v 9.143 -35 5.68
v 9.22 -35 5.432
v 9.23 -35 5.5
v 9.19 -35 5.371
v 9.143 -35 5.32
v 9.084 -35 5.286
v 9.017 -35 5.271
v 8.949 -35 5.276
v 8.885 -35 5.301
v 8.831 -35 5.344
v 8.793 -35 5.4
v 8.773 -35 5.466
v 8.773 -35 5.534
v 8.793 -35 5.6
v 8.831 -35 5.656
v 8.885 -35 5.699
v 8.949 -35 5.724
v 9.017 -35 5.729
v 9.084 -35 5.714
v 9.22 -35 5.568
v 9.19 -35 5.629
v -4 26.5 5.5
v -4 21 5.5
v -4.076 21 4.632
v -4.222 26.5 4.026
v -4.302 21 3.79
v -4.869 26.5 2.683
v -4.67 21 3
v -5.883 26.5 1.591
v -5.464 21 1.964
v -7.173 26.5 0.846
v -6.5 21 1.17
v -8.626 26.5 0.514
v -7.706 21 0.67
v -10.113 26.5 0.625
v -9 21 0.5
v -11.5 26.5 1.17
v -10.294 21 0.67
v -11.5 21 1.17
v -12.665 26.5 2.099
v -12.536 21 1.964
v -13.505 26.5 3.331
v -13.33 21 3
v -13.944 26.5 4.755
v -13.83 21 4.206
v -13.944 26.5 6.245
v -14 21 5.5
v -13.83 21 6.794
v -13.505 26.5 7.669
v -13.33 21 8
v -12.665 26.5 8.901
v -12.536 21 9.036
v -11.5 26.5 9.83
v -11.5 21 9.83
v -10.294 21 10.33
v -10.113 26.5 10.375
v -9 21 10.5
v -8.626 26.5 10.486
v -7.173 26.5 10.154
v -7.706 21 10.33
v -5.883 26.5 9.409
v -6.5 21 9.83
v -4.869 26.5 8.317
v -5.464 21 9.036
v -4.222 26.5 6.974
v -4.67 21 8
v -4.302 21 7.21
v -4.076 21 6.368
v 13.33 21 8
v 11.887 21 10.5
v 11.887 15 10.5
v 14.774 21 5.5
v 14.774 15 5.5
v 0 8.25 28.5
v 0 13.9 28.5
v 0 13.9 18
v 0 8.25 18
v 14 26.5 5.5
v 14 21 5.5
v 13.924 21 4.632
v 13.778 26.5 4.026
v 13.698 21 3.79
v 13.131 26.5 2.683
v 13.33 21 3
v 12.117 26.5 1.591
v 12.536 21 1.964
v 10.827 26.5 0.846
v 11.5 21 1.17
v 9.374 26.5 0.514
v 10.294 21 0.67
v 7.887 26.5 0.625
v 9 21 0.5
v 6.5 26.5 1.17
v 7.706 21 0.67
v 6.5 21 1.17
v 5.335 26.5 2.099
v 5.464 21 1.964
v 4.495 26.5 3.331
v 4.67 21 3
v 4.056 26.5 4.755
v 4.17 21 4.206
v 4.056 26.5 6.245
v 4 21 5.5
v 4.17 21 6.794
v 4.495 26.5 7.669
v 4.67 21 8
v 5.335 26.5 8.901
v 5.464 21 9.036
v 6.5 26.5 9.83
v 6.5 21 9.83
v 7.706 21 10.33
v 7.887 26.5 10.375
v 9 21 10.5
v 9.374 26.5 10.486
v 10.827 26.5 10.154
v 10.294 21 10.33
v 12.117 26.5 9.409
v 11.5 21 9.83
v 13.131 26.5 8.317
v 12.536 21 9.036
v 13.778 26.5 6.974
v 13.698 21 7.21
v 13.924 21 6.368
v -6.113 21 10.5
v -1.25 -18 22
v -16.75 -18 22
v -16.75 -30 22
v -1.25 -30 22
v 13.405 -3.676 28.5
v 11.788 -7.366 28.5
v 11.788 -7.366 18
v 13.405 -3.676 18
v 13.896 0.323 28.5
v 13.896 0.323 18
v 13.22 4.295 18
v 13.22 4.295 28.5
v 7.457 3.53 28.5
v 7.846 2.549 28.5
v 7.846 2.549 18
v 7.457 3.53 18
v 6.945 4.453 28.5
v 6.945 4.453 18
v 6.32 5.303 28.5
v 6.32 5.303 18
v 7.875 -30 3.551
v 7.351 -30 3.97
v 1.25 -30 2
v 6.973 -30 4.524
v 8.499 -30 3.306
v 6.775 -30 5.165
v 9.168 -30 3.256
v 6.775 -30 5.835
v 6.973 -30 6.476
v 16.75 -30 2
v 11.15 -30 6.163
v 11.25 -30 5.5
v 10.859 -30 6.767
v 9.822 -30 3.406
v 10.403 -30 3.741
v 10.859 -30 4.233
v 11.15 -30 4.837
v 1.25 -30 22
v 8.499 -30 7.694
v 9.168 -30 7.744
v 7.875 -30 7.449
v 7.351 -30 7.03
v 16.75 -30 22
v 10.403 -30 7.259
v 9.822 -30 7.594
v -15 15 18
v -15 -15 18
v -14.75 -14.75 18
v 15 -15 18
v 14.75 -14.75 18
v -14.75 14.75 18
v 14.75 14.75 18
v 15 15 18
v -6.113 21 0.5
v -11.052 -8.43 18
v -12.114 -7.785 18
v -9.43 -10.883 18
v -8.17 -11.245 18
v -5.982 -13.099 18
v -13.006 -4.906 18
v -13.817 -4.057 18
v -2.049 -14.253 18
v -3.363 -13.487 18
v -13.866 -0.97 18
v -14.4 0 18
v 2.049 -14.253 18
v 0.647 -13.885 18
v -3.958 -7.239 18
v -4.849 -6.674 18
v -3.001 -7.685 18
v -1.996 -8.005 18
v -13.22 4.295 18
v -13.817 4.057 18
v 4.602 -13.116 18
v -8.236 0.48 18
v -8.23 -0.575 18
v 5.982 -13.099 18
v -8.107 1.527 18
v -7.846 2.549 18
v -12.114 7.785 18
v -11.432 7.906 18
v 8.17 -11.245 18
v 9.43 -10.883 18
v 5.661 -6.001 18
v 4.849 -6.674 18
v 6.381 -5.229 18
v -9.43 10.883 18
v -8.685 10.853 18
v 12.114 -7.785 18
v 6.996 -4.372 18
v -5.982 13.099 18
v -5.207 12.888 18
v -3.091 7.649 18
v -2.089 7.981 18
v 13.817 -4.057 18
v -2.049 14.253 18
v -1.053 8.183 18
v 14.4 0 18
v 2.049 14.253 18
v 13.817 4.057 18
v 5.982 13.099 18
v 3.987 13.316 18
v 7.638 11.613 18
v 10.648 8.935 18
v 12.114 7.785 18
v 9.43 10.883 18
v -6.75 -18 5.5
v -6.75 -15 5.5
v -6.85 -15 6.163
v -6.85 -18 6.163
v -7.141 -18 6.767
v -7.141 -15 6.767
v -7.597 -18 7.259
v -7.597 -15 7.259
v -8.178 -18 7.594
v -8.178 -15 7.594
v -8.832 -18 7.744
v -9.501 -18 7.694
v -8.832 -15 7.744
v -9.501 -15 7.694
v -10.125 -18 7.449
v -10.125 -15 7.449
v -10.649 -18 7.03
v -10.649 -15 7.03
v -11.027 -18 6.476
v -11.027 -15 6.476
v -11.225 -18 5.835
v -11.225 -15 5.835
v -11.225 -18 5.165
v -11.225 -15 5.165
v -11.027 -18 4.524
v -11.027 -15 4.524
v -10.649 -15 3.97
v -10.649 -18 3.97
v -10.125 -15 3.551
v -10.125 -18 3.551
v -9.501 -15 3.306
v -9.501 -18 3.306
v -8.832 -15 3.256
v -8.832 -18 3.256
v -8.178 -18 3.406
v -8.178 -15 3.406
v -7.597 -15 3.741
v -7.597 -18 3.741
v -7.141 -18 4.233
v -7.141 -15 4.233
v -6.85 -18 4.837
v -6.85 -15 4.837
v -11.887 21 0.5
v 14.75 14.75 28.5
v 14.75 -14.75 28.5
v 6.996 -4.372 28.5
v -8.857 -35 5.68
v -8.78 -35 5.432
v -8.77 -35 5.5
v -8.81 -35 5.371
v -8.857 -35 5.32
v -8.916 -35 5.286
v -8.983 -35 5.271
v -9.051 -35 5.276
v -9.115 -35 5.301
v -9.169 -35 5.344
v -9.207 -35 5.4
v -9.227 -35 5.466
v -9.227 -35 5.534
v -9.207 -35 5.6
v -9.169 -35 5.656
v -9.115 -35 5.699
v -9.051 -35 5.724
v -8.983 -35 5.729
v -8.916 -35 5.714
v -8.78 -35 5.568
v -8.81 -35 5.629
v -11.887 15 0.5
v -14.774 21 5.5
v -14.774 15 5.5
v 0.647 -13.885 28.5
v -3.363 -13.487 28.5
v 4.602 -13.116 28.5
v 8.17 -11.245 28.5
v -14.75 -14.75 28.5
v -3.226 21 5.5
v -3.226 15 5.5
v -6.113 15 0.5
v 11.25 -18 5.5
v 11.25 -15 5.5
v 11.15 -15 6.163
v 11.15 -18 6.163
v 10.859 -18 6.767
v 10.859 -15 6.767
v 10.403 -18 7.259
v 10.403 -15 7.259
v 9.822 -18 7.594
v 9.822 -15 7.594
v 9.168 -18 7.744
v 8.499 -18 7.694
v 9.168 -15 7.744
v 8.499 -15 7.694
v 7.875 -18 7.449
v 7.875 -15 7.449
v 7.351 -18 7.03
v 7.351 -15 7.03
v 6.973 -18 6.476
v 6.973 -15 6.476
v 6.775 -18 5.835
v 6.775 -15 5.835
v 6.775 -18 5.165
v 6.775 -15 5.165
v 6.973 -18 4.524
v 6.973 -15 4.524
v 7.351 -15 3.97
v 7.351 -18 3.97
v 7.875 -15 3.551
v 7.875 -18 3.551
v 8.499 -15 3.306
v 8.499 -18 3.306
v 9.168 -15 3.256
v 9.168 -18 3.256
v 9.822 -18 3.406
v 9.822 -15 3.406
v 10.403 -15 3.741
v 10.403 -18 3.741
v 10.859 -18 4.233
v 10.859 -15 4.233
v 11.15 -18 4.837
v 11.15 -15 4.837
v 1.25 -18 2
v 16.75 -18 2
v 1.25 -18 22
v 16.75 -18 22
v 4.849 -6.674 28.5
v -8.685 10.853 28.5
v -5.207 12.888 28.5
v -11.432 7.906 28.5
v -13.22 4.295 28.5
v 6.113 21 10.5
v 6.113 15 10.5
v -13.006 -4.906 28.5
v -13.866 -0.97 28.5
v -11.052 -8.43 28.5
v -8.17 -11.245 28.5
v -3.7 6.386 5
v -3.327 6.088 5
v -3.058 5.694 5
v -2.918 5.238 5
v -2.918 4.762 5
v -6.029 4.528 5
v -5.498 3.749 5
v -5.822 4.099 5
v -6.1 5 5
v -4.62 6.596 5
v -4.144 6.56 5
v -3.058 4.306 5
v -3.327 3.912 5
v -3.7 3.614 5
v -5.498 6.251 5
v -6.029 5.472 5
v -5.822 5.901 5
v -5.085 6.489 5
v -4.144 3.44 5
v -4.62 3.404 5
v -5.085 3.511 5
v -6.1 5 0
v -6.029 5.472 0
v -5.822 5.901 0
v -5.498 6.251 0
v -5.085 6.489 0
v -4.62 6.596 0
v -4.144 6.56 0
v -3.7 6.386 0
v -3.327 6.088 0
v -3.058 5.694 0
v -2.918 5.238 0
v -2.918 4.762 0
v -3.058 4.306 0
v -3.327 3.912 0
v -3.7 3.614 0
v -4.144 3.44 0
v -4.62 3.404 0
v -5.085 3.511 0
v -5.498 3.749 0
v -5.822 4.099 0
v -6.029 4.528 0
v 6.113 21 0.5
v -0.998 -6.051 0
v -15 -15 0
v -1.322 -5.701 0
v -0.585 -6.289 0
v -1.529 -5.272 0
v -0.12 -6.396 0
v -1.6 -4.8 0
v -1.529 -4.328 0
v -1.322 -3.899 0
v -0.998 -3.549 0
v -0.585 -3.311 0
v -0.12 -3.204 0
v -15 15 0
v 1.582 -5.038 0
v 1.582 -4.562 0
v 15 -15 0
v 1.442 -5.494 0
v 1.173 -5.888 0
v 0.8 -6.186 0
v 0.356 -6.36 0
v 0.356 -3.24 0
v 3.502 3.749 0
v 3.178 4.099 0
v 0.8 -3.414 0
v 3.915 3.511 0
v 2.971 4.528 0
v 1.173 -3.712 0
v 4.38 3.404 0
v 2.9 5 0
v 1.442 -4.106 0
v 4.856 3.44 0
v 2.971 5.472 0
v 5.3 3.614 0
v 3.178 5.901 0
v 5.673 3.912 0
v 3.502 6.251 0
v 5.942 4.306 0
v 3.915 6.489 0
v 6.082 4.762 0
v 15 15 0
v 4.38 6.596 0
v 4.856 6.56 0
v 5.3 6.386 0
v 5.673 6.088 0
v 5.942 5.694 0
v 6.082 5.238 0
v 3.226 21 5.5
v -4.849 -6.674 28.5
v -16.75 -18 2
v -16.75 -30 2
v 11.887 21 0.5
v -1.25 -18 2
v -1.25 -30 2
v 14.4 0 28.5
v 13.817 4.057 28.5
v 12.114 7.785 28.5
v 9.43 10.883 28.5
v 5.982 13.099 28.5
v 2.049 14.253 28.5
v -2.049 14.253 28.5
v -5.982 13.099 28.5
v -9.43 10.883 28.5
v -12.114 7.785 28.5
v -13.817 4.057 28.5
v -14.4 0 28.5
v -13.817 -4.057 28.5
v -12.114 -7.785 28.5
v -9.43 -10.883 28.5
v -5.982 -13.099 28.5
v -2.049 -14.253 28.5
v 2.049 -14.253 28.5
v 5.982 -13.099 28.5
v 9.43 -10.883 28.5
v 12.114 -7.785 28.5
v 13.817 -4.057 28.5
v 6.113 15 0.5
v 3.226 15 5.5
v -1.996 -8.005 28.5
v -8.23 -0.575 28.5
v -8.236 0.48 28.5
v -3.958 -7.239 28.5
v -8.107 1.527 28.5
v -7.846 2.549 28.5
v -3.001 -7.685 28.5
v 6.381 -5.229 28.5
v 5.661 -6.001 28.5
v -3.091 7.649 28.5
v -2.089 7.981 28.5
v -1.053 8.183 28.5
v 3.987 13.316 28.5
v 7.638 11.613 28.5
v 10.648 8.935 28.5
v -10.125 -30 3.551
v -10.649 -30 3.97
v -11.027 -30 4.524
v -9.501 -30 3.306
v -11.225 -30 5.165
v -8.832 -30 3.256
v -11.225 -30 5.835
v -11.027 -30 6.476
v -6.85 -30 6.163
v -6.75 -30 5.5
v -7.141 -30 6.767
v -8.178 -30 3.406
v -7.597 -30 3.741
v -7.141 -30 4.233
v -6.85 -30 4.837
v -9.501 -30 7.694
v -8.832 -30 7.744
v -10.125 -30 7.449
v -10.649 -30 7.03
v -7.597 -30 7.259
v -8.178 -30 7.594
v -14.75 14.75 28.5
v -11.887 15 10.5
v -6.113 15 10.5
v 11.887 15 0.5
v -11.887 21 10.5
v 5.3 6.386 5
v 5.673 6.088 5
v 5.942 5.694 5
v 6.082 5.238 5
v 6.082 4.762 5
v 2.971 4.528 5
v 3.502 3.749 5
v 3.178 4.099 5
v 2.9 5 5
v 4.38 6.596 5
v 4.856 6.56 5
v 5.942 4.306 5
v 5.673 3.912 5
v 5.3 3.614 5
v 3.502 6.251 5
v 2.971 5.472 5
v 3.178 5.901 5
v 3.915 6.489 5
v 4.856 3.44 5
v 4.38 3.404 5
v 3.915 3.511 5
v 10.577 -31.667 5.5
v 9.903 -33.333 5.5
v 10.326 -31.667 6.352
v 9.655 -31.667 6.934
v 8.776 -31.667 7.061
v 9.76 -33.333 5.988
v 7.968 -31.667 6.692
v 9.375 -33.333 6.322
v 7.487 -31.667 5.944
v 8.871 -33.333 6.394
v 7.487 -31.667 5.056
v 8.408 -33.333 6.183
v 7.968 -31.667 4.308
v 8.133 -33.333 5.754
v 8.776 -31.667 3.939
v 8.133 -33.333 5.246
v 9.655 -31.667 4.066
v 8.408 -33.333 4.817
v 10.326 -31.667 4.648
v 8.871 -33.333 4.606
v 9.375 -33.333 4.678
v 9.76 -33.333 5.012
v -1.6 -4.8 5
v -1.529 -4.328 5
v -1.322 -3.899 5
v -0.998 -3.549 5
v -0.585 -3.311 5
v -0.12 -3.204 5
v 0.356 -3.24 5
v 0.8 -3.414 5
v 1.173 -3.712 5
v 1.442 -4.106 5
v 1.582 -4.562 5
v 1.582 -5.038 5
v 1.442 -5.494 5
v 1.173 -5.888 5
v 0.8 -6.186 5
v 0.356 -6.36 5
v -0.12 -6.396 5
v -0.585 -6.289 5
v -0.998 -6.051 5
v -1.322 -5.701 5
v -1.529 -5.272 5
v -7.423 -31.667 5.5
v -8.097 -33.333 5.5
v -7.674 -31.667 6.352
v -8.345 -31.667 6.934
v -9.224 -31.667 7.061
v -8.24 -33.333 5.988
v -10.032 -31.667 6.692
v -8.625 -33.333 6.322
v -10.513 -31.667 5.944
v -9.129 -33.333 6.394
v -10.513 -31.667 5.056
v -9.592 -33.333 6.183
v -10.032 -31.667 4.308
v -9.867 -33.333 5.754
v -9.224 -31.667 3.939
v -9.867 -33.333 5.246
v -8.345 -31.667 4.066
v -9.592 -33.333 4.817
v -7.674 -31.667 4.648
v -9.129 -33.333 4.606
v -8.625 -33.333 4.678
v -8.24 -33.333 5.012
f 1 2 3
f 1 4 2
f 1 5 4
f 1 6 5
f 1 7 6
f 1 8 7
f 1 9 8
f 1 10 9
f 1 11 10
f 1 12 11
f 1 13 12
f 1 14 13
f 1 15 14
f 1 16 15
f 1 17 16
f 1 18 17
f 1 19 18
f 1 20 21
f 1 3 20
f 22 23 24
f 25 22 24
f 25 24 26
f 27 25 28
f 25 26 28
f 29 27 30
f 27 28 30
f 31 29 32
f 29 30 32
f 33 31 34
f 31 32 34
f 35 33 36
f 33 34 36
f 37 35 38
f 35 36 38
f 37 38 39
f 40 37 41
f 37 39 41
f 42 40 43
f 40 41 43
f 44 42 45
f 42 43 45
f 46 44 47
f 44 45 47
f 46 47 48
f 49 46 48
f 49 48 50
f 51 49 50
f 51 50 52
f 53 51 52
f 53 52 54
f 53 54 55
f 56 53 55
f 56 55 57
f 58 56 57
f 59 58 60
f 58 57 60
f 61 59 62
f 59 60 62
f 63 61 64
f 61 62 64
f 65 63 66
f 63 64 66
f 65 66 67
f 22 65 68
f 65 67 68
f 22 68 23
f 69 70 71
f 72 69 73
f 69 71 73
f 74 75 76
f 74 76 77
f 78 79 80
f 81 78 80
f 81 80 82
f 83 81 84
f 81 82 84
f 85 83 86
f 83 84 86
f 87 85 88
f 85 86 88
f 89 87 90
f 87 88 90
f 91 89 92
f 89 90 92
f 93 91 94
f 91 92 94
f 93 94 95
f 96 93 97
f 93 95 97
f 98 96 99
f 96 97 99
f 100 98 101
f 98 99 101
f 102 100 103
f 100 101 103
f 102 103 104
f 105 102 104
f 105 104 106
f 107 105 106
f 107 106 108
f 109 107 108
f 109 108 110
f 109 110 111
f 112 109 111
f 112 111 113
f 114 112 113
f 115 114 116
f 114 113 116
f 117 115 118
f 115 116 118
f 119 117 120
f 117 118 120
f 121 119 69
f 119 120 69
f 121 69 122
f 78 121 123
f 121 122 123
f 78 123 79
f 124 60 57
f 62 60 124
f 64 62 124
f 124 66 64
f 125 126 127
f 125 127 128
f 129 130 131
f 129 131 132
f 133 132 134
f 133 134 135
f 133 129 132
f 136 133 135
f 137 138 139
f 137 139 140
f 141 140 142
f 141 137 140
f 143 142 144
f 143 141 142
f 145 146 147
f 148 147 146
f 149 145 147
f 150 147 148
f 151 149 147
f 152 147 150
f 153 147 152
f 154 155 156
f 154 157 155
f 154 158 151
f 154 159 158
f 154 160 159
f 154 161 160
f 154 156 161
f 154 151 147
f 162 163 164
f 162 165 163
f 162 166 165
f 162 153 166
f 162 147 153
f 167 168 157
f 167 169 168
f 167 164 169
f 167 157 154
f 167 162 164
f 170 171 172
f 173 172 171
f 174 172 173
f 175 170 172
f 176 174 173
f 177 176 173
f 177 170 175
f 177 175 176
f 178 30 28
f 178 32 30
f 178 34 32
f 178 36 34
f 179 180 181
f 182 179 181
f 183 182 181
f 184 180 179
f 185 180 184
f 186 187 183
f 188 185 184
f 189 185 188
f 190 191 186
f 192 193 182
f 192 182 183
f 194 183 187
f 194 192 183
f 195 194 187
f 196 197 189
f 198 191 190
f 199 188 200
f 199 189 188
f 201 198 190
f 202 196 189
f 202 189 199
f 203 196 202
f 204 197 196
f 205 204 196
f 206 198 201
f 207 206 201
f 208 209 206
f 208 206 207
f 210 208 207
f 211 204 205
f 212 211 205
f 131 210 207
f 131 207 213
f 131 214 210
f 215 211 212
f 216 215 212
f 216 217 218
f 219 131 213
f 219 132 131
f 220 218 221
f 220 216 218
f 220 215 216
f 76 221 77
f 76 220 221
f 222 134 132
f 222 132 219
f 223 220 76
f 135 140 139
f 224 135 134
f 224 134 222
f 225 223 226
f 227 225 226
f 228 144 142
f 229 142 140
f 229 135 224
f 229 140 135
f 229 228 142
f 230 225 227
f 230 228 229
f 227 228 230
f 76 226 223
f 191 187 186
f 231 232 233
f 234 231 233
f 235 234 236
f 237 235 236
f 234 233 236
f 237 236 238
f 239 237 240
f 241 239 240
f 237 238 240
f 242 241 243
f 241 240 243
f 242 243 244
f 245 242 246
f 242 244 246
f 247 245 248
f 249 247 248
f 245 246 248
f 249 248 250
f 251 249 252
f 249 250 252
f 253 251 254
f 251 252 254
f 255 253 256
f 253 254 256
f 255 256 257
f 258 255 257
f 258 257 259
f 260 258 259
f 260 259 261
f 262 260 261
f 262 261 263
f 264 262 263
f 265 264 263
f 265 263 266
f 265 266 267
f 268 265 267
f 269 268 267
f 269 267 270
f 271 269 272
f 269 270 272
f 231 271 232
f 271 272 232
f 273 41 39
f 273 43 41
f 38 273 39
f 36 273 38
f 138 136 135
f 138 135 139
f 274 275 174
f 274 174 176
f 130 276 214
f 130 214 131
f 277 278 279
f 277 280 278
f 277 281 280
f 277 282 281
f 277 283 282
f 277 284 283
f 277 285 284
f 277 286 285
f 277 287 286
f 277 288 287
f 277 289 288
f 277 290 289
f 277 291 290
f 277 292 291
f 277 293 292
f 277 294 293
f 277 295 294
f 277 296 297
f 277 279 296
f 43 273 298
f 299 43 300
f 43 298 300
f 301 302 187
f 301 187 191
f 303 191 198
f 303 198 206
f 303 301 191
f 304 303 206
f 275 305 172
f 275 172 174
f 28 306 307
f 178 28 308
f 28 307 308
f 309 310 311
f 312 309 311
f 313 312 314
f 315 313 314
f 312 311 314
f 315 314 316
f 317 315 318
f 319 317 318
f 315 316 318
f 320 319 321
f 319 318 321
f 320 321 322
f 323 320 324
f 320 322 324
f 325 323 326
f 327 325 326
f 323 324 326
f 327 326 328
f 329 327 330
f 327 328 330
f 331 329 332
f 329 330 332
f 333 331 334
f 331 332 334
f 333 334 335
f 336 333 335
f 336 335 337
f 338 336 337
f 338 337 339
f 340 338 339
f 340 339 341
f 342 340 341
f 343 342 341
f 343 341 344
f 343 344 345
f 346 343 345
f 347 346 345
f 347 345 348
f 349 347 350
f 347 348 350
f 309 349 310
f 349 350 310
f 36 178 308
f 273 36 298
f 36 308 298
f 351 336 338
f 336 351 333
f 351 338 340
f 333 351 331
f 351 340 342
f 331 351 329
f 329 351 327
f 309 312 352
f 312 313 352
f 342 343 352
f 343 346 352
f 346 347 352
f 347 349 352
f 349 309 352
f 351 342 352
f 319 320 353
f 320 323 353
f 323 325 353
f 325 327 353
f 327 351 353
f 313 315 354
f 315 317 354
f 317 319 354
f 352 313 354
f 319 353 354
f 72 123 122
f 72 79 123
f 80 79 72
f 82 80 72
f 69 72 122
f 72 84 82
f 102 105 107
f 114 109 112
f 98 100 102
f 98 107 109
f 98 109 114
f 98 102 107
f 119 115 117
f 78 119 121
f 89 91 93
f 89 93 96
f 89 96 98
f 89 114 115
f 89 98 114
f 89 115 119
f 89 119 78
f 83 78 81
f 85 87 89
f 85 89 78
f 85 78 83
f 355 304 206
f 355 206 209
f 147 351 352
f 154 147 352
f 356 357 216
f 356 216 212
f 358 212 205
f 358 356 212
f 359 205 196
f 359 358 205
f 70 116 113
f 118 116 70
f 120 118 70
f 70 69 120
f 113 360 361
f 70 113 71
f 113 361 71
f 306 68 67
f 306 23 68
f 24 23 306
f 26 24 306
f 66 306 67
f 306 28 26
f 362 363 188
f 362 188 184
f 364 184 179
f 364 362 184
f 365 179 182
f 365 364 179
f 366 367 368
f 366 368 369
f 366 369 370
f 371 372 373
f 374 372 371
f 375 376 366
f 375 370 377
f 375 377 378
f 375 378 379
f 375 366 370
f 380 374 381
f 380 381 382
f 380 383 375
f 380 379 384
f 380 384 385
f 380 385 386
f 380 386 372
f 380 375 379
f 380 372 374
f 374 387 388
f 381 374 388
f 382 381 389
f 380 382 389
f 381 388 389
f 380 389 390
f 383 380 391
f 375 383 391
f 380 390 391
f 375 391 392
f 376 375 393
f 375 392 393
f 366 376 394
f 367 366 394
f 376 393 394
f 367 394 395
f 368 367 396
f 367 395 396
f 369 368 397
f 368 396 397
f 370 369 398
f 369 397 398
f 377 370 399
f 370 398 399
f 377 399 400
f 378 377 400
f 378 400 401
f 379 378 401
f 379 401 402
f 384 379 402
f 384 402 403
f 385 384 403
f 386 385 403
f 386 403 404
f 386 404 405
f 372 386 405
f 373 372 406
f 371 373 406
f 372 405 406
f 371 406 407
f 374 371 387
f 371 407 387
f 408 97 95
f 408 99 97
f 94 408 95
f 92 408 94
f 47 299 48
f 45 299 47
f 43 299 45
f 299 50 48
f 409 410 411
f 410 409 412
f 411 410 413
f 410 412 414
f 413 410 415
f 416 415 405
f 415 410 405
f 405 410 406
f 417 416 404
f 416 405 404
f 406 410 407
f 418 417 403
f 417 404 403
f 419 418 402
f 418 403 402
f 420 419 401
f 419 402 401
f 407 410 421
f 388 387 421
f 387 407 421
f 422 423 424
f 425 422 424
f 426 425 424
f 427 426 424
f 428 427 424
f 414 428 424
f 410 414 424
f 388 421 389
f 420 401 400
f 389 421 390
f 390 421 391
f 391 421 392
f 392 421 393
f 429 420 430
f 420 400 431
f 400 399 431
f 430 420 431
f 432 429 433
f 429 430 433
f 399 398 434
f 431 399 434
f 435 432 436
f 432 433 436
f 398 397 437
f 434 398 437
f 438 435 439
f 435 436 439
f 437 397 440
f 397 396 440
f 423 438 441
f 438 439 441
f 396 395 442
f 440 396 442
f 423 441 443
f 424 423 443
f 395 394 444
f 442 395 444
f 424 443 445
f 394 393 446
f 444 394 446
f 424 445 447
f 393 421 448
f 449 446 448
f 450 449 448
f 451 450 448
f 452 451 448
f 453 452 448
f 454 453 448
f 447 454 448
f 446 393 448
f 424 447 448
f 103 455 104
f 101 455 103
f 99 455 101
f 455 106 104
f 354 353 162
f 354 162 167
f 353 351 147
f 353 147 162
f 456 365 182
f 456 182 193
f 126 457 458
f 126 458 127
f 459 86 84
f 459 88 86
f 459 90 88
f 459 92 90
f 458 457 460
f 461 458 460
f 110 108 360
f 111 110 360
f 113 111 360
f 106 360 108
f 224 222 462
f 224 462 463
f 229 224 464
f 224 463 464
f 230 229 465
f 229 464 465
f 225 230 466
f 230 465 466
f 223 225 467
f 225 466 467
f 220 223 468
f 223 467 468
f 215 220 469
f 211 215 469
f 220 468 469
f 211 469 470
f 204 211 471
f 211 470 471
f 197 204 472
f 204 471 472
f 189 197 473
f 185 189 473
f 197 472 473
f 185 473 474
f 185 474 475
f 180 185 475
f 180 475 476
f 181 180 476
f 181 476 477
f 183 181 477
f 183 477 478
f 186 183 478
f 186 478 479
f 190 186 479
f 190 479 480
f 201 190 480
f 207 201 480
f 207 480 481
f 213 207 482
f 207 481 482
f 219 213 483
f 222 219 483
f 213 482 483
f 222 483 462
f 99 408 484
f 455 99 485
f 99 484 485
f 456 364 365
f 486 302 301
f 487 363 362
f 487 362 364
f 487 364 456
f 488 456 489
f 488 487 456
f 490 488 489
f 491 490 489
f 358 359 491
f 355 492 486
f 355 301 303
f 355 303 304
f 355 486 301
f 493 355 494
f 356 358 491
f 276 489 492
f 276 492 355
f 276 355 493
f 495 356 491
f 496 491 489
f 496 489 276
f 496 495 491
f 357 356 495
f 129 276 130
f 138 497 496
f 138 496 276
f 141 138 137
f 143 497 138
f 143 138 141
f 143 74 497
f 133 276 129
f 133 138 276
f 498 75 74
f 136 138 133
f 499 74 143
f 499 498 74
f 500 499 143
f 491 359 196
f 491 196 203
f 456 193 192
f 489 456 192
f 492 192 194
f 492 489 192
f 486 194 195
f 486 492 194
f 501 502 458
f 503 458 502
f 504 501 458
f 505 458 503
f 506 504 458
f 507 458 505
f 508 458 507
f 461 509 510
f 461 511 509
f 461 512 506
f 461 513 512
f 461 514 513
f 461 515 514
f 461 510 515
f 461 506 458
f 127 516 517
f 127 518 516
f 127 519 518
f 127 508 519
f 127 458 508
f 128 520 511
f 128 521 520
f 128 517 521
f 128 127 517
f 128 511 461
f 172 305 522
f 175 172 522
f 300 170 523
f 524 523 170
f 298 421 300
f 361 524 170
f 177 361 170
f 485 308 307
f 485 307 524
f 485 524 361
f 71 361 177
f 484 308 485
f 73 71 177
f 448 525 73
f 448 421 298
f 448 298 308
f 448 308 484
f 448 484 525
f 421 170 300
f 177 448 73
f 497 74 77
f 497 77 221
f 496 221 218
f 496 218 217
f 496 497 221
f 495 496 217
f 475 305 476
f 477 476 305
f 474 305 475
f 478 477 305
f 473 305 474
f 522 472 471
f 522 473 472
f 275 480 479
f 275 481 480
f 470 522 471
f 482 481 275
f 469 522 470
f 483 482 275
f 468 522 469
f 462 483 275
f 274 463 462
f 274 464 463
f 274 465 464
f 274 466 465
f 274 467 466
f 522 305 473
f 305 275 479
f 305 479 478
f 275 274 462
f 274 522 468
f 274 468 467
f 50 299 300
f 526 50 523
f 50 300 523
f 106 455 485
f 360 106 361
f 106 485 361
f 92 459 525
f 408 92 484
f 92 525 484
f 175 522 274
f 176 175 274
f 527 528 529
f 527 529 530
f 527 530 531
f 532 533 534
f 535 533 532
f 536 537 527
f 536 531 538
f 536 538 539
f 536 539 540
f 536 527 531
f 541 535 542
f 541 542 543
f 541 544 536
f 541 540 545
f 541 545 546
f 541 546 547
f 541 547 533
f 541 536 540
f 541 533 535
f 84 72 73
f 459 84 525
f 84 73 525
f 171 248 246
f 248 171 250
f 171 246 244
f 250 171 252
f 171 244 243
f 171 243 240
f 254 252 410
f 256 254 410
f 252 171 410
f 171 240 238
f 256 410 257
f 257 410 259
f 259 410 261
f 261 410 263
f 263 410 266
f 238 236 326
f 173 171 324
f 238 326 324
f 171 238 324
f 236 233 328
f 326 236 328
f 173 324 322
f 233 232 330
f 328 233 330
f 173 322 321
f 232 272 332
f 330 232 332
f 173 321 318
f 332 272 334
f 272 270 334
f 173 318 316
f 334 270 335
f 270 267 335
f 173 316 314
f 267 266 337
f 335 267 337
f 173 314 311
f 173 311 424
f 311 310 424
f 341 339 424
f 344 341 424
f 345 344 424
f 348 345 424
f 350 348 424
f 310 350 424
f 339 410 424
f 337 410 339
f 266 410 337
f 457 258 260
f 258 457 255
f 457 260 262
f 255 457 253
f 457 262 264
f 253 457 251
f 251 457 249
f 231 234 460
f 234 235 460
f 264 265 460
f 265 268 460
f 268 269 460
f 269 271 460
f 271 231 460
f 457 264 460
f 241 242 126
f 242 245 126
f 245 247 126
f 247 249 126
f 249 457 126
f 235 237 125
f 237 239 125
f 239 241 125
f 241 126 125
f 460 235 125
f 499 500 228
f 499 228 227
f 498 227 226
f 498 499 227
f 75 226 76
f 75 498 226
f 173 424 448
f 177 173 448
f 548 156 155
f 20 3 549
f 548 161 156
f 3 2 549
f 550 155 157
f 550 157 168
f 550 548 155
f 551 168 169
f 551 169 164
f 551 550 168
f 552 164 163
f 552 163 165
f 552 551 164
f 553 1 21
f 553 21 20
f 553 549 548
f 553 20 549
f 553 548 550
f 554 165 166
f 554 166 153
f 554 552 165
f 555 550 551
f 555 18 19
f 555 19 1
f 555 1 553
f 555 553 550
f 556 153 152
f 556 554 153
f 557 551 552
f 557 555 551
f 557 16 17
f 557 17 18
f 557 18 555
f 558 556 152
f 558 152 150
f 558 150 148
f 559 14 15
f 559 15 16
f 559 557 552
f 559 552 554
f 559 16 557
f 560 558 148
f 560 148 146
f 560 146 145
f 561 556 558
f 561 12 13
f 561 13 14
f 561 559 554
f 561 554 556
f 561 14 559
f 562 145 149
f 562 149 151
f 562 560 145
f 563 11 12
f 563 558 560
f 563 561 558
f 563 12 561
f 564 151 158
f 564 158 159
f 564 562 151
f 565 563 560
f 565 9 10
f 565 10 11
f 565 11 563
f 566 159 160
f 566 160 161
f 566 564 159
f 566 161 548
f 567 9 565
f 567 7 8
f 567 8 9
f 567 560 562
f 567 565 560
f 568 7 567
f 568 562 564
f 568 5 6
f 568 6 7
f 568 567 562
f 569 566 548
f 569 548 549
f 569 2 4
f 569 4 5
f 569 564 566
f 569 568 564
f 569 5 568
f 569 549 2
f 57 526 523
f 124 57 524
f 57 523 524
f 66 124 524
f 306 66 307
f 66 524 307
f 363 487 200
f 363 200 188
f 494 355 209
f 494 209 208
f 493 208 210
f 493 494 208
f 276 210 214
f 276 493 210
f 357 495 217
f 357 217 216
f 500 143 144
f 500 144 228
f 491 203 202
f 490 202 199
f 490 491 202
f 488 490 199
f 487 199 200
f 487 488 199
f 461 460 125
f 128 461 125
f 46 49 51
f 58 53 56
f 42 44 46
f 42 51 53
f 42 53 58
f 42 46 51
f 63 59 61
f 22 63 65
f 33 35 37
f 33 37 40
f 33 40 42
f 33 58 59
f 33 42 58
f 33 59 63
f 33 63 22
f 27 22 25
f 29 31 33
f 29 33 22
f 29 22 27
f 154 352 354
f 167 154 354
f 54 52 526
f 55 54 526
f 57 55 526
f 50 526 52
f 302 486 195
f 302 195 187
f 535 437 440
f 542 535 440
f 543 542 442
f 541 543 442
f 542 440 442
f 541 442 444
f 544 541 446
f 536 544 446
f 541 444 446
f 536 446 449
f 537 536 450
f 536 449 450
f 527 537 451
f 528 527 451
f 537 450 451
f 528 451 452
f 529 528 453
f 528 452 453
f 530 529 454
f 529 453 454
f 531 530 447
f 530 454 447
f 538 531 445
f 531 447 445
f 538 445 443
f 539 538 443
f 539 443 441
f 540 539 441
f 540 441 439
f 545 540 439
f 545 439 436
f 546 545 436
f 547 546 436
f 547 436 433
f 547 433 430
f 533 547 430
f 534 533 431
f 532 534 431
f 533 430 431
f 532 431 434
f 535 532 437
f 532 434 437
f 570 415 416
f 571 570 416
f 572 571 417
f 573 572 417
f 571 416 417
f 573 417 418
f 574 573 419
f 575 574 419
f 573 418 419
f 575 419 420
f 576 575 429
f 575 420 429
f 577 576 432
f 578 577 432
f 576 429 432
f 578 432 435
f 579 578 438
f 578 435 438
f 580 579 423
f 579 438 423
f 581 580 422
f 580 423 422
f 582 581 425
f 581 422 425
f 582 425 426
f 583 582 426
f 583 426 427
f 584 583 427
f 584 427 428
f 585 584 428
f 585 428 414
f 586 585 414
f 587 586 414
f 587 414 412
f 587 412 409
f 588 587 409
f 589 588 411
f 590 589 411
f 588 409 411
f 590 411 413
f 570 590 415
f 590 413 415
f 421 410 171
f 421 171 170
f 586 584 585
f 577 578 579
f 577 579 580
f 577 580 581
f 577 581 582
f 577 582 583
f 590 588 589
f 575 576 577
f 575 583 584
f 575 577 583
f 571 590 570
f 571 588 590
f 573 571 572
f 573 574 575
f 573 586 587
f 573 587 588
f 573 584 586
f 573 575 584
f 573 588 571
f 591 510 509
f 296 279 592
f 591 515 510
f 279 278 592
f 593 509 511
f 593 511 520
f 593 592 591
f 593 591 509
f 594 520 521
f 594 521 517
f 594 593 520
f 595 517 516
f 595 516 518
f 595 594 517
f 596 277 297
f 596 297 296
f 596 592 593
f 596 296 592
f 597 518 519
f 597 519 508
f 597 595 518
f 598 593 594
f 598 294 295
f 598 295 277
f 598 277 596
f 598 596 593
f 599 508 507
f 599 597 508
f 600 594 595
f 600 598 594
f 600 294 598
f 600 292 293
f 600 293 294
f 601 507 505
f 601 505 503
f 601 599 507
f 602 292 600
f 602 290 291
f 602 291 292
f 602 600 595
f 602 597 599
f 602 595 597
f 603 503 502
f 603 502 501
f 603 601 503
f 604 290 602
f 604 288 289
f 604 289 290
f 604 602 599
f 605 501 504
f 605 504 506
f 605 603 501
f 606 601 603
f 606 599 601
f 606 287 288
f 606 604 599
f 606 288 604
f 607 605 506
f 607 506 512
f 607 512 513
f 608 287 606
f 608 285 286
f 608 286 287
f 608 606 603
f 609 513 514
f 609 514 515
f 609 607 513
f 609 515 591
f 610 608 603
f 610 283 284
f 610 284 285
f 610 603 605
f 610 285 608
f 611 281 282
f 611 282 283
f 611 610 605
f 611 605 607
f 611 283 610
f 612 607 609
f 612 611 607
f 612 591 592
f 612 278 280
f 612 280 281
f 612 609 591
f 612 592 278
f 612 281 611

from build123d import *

# Parameters (mm, degrees)
ESBO_O1_W                = 30
ESBO_O1_H                = 30
RESSALTO_EXTRUS_O1_DEPTH = 28.5
ESBO_O2_R                = 1.6
CORTE_EXTRUS_O1_DEPTH    = 5
ESBO_O3_R                = 2.25
RESSALTO_EXTRUS_O2_DEPTH = 3
ESBO_O4_W                = 15.5
ESBO_O4_H                = 20
RESSALTO_EXTRUS_O3_DEPTH = 12
ESBO_O5_R                = 2.25
RESSALTO_EXTRUS_O4_DEPTH = 5
RESSALTO_EXTRUS_O4_TAPER = 22
ESBO_O6_W                = 30
ESBO_O6_H                = 30
ESBO_O6_W_2              = 29.5
ESBO_O6_H_2              = 29.5
ESBO_O6_R                = 14.4
CORTE_EXTRUS_O2_DEPTH    = 10.5
RESSALTO_EXTRUS_O5_DEPTH = 6
ESBO_O10_R               = 5
RESSALTO_EXTRUS_O6_DEPTH = 5.5


with BuildPart() as part:
    # Esboço1 → Ressalto-extrusão1 (new body)
    with BuildSketch(Plane.XY):
        Rectangle(ESBO_O1_W, ESBO_O1_H)
    extrude(amount=RESSALTO_EXTRUS_O1_DEPTH)

    # Esboço2 → Corte-extrusão1 (cut)
    with BuildSketch(Plane(origin=(0, 0, 0), x_dir=(-1, 0, 0), z_dir=(0, 0, -1))):
        with Locations((4.5, 5)):
            Circle(ESBO_O2_R)
        with Locations((-4.5, 5)):
            Circle(ESBO_O2_R)
        with Locations((0, -4.8)):
            Circle(ESBO_O2_R)
    extrude(amount=-CORTE_EXTRUS_O1_DEPTH, mode=Mode.SUBTRACT)

    # Esboço3 → Ressalto-extrusão2 (add)
    with BuildSketch(Plane.XZ.offset(15)):
        with Locations((-9, 5.5)):
            Circle(ESBO_O3_R)
        with Locations((9, 5.5)):
            Circle(ESBO_O3_R)
    extrude(amount=RESSALTO_EXTRUS_O2_DEPTH)

    # Esboço4 → Ressalto-extrusão3 (add)
    with BuildSketch(Plane.XZ.offset(18)):
        with Locations((-9, 12)):
            Rectangle(ESBO_O4_W, ESBO_O4_H)
        with Locations((9, 12)):
            Rectangle(ESBO_O4_W, ESBO_O4_H)
    extrude(amount=RESSALTO_EXTRUS_O3_DEPTH)

    # Esboço5 → Ressalto-extrusão4 (add)
    with BuildSketch(Plane.XZ.offset(30)):
        with Locations((9, 5.5)):
            Circle(ESBO_O5_R)
        with Locations((-9, 5.5)):
            Circle(ESBO_O5_R)
    extrude(amount=RESSALTO_EXTRUS_O4_DEPTH, taper=RESSALTO_EXTRUS_O4_TAPER)

    # Esboço6 → Corte-extrusão2 (cut)
    with BuildSketch(Plane.XY.offset(28.5)):
        Rectangle(ESBO_O6_W, ESBO_O6_H)
        Rectangle(ESBO_O6_W_2, ESBO_O6_H_2, mode=Mode.SUBTRACT)
        Circle(ESBO_O6_R)
        with BuildLine():
            ThreePointArc((-7.846216259, 2.549390204), (-8.188505751, 1.005422083), (-8.229903415, -0.575490908))
            Line((-8.229903415, -0.575490908), (-13.866140299, -0.969614985))
            ThreePointArc((-13.866140299, -0.969614985), (-12.157213929, -6.738853721), (-8.170215007, -11.245336222))
            Line((-8.170215007, -11.245336222), (-4.849228331, -6.674390204))
            ThreePointArc((-4.849228331, -6.674390204), (-3.486600659, -7.477039243), (-1.995855639, -8.004939742))
            Line((-1.995855639, -8.004939742), (-3.362714349, -13.487110595))
            ThreePointArc((-3.362714349, -13.487110595), (2.652245036, -13.64461785), (8.170215007, -11.245336222))
            Line((8.170215007, -11.245336222), (4.849228331, -6.674390204))
            ThreePointArc((4.849228331, -6.674390204), (6.033668038, -5.626486471), (6.996396793, -4.37183393))
            Line((6.996396793, -4.37183393), (11.787868537, -7.365877773))
            ThreePointArc((11.787868537, -7.365877773), (13.796391508, -1.693983873), (13.219685577, 4.295336222))
            Line((13.219685577, 4.295336222), (7.846216259, 2.549390204))
            ThreePointArc((7.846216259, 2.549390204), (7.215612584, 3.999679367), (6.319866656, 5.30299778))
            Line((6.319866656, 5.30299778), (10.648017759, 8.934747775))
            ThreePointArc((10.648017759, 8.934747775), (5.874393838, 12.59767824), (0, 13.9))
            Line((0, 13.9), (0, 8.25))
            ThreePointArc((0, 8.25), (-1.574174212, 8.098424263), (-3.090504396, 7.6492668))
            Line((-3.090504396, 7.6492668), (-5.207031648, 12.887855578))
            ThreePointArc((-5.207031648, 12.887855578), (-10.165816453, 9.479777205), (-13.219685577, 4.295336222))
            Line((-13.219685577, 4.295336222), (-7.846216259, 2.549390204))
        make_face(mode=Mode.SUBTRACT)
    extrude(amount=-CORTE_EXTRUS_O2_DEPTH, mode=Mode.SUBTRACT)

    # Esboço9 → Ressalto-extrusão5 (add)
    with BuildSketch(Plane(origin=(0, 15, 0), x_dir=(1, 0, 0), z_dir=(0, 1, 0))):
        Polygon((14.773502692, -5.5), (11.886751346, -0.5), (6.113248654, -0.5), (3.226497308, -5.5), (6.113248654, -10.5), (11.886751346, -10.5), align=None)
        Polygon((-3.226497308, -5.5), (-6.113248654, -0.5), (-11.886751346, -0.5), (-14.773502692, -5.5), (-11.886751346, -10.5), (-6.113248654, -10.5), align=None)
    extrude(amount=RESSALTO_EXTRUS_O5_DEPTH)

    # Esboço10 → Ressalto-extrusão6 (add)
    with BuildSketch(Plane(origin=(0, 21, 0), x_dir=(1, 0, 0), z_dir=(0, 1, 0))):
        with Locations((-9, -5.5)):
            Circle(ESBO_O10_R)
        with Locations((9, -5.5)):
            Circle(ESBO_O10_R)
    extrude(amount=RESSALTO_EXTRUS_O6_DEPTH)


solid = part.part
